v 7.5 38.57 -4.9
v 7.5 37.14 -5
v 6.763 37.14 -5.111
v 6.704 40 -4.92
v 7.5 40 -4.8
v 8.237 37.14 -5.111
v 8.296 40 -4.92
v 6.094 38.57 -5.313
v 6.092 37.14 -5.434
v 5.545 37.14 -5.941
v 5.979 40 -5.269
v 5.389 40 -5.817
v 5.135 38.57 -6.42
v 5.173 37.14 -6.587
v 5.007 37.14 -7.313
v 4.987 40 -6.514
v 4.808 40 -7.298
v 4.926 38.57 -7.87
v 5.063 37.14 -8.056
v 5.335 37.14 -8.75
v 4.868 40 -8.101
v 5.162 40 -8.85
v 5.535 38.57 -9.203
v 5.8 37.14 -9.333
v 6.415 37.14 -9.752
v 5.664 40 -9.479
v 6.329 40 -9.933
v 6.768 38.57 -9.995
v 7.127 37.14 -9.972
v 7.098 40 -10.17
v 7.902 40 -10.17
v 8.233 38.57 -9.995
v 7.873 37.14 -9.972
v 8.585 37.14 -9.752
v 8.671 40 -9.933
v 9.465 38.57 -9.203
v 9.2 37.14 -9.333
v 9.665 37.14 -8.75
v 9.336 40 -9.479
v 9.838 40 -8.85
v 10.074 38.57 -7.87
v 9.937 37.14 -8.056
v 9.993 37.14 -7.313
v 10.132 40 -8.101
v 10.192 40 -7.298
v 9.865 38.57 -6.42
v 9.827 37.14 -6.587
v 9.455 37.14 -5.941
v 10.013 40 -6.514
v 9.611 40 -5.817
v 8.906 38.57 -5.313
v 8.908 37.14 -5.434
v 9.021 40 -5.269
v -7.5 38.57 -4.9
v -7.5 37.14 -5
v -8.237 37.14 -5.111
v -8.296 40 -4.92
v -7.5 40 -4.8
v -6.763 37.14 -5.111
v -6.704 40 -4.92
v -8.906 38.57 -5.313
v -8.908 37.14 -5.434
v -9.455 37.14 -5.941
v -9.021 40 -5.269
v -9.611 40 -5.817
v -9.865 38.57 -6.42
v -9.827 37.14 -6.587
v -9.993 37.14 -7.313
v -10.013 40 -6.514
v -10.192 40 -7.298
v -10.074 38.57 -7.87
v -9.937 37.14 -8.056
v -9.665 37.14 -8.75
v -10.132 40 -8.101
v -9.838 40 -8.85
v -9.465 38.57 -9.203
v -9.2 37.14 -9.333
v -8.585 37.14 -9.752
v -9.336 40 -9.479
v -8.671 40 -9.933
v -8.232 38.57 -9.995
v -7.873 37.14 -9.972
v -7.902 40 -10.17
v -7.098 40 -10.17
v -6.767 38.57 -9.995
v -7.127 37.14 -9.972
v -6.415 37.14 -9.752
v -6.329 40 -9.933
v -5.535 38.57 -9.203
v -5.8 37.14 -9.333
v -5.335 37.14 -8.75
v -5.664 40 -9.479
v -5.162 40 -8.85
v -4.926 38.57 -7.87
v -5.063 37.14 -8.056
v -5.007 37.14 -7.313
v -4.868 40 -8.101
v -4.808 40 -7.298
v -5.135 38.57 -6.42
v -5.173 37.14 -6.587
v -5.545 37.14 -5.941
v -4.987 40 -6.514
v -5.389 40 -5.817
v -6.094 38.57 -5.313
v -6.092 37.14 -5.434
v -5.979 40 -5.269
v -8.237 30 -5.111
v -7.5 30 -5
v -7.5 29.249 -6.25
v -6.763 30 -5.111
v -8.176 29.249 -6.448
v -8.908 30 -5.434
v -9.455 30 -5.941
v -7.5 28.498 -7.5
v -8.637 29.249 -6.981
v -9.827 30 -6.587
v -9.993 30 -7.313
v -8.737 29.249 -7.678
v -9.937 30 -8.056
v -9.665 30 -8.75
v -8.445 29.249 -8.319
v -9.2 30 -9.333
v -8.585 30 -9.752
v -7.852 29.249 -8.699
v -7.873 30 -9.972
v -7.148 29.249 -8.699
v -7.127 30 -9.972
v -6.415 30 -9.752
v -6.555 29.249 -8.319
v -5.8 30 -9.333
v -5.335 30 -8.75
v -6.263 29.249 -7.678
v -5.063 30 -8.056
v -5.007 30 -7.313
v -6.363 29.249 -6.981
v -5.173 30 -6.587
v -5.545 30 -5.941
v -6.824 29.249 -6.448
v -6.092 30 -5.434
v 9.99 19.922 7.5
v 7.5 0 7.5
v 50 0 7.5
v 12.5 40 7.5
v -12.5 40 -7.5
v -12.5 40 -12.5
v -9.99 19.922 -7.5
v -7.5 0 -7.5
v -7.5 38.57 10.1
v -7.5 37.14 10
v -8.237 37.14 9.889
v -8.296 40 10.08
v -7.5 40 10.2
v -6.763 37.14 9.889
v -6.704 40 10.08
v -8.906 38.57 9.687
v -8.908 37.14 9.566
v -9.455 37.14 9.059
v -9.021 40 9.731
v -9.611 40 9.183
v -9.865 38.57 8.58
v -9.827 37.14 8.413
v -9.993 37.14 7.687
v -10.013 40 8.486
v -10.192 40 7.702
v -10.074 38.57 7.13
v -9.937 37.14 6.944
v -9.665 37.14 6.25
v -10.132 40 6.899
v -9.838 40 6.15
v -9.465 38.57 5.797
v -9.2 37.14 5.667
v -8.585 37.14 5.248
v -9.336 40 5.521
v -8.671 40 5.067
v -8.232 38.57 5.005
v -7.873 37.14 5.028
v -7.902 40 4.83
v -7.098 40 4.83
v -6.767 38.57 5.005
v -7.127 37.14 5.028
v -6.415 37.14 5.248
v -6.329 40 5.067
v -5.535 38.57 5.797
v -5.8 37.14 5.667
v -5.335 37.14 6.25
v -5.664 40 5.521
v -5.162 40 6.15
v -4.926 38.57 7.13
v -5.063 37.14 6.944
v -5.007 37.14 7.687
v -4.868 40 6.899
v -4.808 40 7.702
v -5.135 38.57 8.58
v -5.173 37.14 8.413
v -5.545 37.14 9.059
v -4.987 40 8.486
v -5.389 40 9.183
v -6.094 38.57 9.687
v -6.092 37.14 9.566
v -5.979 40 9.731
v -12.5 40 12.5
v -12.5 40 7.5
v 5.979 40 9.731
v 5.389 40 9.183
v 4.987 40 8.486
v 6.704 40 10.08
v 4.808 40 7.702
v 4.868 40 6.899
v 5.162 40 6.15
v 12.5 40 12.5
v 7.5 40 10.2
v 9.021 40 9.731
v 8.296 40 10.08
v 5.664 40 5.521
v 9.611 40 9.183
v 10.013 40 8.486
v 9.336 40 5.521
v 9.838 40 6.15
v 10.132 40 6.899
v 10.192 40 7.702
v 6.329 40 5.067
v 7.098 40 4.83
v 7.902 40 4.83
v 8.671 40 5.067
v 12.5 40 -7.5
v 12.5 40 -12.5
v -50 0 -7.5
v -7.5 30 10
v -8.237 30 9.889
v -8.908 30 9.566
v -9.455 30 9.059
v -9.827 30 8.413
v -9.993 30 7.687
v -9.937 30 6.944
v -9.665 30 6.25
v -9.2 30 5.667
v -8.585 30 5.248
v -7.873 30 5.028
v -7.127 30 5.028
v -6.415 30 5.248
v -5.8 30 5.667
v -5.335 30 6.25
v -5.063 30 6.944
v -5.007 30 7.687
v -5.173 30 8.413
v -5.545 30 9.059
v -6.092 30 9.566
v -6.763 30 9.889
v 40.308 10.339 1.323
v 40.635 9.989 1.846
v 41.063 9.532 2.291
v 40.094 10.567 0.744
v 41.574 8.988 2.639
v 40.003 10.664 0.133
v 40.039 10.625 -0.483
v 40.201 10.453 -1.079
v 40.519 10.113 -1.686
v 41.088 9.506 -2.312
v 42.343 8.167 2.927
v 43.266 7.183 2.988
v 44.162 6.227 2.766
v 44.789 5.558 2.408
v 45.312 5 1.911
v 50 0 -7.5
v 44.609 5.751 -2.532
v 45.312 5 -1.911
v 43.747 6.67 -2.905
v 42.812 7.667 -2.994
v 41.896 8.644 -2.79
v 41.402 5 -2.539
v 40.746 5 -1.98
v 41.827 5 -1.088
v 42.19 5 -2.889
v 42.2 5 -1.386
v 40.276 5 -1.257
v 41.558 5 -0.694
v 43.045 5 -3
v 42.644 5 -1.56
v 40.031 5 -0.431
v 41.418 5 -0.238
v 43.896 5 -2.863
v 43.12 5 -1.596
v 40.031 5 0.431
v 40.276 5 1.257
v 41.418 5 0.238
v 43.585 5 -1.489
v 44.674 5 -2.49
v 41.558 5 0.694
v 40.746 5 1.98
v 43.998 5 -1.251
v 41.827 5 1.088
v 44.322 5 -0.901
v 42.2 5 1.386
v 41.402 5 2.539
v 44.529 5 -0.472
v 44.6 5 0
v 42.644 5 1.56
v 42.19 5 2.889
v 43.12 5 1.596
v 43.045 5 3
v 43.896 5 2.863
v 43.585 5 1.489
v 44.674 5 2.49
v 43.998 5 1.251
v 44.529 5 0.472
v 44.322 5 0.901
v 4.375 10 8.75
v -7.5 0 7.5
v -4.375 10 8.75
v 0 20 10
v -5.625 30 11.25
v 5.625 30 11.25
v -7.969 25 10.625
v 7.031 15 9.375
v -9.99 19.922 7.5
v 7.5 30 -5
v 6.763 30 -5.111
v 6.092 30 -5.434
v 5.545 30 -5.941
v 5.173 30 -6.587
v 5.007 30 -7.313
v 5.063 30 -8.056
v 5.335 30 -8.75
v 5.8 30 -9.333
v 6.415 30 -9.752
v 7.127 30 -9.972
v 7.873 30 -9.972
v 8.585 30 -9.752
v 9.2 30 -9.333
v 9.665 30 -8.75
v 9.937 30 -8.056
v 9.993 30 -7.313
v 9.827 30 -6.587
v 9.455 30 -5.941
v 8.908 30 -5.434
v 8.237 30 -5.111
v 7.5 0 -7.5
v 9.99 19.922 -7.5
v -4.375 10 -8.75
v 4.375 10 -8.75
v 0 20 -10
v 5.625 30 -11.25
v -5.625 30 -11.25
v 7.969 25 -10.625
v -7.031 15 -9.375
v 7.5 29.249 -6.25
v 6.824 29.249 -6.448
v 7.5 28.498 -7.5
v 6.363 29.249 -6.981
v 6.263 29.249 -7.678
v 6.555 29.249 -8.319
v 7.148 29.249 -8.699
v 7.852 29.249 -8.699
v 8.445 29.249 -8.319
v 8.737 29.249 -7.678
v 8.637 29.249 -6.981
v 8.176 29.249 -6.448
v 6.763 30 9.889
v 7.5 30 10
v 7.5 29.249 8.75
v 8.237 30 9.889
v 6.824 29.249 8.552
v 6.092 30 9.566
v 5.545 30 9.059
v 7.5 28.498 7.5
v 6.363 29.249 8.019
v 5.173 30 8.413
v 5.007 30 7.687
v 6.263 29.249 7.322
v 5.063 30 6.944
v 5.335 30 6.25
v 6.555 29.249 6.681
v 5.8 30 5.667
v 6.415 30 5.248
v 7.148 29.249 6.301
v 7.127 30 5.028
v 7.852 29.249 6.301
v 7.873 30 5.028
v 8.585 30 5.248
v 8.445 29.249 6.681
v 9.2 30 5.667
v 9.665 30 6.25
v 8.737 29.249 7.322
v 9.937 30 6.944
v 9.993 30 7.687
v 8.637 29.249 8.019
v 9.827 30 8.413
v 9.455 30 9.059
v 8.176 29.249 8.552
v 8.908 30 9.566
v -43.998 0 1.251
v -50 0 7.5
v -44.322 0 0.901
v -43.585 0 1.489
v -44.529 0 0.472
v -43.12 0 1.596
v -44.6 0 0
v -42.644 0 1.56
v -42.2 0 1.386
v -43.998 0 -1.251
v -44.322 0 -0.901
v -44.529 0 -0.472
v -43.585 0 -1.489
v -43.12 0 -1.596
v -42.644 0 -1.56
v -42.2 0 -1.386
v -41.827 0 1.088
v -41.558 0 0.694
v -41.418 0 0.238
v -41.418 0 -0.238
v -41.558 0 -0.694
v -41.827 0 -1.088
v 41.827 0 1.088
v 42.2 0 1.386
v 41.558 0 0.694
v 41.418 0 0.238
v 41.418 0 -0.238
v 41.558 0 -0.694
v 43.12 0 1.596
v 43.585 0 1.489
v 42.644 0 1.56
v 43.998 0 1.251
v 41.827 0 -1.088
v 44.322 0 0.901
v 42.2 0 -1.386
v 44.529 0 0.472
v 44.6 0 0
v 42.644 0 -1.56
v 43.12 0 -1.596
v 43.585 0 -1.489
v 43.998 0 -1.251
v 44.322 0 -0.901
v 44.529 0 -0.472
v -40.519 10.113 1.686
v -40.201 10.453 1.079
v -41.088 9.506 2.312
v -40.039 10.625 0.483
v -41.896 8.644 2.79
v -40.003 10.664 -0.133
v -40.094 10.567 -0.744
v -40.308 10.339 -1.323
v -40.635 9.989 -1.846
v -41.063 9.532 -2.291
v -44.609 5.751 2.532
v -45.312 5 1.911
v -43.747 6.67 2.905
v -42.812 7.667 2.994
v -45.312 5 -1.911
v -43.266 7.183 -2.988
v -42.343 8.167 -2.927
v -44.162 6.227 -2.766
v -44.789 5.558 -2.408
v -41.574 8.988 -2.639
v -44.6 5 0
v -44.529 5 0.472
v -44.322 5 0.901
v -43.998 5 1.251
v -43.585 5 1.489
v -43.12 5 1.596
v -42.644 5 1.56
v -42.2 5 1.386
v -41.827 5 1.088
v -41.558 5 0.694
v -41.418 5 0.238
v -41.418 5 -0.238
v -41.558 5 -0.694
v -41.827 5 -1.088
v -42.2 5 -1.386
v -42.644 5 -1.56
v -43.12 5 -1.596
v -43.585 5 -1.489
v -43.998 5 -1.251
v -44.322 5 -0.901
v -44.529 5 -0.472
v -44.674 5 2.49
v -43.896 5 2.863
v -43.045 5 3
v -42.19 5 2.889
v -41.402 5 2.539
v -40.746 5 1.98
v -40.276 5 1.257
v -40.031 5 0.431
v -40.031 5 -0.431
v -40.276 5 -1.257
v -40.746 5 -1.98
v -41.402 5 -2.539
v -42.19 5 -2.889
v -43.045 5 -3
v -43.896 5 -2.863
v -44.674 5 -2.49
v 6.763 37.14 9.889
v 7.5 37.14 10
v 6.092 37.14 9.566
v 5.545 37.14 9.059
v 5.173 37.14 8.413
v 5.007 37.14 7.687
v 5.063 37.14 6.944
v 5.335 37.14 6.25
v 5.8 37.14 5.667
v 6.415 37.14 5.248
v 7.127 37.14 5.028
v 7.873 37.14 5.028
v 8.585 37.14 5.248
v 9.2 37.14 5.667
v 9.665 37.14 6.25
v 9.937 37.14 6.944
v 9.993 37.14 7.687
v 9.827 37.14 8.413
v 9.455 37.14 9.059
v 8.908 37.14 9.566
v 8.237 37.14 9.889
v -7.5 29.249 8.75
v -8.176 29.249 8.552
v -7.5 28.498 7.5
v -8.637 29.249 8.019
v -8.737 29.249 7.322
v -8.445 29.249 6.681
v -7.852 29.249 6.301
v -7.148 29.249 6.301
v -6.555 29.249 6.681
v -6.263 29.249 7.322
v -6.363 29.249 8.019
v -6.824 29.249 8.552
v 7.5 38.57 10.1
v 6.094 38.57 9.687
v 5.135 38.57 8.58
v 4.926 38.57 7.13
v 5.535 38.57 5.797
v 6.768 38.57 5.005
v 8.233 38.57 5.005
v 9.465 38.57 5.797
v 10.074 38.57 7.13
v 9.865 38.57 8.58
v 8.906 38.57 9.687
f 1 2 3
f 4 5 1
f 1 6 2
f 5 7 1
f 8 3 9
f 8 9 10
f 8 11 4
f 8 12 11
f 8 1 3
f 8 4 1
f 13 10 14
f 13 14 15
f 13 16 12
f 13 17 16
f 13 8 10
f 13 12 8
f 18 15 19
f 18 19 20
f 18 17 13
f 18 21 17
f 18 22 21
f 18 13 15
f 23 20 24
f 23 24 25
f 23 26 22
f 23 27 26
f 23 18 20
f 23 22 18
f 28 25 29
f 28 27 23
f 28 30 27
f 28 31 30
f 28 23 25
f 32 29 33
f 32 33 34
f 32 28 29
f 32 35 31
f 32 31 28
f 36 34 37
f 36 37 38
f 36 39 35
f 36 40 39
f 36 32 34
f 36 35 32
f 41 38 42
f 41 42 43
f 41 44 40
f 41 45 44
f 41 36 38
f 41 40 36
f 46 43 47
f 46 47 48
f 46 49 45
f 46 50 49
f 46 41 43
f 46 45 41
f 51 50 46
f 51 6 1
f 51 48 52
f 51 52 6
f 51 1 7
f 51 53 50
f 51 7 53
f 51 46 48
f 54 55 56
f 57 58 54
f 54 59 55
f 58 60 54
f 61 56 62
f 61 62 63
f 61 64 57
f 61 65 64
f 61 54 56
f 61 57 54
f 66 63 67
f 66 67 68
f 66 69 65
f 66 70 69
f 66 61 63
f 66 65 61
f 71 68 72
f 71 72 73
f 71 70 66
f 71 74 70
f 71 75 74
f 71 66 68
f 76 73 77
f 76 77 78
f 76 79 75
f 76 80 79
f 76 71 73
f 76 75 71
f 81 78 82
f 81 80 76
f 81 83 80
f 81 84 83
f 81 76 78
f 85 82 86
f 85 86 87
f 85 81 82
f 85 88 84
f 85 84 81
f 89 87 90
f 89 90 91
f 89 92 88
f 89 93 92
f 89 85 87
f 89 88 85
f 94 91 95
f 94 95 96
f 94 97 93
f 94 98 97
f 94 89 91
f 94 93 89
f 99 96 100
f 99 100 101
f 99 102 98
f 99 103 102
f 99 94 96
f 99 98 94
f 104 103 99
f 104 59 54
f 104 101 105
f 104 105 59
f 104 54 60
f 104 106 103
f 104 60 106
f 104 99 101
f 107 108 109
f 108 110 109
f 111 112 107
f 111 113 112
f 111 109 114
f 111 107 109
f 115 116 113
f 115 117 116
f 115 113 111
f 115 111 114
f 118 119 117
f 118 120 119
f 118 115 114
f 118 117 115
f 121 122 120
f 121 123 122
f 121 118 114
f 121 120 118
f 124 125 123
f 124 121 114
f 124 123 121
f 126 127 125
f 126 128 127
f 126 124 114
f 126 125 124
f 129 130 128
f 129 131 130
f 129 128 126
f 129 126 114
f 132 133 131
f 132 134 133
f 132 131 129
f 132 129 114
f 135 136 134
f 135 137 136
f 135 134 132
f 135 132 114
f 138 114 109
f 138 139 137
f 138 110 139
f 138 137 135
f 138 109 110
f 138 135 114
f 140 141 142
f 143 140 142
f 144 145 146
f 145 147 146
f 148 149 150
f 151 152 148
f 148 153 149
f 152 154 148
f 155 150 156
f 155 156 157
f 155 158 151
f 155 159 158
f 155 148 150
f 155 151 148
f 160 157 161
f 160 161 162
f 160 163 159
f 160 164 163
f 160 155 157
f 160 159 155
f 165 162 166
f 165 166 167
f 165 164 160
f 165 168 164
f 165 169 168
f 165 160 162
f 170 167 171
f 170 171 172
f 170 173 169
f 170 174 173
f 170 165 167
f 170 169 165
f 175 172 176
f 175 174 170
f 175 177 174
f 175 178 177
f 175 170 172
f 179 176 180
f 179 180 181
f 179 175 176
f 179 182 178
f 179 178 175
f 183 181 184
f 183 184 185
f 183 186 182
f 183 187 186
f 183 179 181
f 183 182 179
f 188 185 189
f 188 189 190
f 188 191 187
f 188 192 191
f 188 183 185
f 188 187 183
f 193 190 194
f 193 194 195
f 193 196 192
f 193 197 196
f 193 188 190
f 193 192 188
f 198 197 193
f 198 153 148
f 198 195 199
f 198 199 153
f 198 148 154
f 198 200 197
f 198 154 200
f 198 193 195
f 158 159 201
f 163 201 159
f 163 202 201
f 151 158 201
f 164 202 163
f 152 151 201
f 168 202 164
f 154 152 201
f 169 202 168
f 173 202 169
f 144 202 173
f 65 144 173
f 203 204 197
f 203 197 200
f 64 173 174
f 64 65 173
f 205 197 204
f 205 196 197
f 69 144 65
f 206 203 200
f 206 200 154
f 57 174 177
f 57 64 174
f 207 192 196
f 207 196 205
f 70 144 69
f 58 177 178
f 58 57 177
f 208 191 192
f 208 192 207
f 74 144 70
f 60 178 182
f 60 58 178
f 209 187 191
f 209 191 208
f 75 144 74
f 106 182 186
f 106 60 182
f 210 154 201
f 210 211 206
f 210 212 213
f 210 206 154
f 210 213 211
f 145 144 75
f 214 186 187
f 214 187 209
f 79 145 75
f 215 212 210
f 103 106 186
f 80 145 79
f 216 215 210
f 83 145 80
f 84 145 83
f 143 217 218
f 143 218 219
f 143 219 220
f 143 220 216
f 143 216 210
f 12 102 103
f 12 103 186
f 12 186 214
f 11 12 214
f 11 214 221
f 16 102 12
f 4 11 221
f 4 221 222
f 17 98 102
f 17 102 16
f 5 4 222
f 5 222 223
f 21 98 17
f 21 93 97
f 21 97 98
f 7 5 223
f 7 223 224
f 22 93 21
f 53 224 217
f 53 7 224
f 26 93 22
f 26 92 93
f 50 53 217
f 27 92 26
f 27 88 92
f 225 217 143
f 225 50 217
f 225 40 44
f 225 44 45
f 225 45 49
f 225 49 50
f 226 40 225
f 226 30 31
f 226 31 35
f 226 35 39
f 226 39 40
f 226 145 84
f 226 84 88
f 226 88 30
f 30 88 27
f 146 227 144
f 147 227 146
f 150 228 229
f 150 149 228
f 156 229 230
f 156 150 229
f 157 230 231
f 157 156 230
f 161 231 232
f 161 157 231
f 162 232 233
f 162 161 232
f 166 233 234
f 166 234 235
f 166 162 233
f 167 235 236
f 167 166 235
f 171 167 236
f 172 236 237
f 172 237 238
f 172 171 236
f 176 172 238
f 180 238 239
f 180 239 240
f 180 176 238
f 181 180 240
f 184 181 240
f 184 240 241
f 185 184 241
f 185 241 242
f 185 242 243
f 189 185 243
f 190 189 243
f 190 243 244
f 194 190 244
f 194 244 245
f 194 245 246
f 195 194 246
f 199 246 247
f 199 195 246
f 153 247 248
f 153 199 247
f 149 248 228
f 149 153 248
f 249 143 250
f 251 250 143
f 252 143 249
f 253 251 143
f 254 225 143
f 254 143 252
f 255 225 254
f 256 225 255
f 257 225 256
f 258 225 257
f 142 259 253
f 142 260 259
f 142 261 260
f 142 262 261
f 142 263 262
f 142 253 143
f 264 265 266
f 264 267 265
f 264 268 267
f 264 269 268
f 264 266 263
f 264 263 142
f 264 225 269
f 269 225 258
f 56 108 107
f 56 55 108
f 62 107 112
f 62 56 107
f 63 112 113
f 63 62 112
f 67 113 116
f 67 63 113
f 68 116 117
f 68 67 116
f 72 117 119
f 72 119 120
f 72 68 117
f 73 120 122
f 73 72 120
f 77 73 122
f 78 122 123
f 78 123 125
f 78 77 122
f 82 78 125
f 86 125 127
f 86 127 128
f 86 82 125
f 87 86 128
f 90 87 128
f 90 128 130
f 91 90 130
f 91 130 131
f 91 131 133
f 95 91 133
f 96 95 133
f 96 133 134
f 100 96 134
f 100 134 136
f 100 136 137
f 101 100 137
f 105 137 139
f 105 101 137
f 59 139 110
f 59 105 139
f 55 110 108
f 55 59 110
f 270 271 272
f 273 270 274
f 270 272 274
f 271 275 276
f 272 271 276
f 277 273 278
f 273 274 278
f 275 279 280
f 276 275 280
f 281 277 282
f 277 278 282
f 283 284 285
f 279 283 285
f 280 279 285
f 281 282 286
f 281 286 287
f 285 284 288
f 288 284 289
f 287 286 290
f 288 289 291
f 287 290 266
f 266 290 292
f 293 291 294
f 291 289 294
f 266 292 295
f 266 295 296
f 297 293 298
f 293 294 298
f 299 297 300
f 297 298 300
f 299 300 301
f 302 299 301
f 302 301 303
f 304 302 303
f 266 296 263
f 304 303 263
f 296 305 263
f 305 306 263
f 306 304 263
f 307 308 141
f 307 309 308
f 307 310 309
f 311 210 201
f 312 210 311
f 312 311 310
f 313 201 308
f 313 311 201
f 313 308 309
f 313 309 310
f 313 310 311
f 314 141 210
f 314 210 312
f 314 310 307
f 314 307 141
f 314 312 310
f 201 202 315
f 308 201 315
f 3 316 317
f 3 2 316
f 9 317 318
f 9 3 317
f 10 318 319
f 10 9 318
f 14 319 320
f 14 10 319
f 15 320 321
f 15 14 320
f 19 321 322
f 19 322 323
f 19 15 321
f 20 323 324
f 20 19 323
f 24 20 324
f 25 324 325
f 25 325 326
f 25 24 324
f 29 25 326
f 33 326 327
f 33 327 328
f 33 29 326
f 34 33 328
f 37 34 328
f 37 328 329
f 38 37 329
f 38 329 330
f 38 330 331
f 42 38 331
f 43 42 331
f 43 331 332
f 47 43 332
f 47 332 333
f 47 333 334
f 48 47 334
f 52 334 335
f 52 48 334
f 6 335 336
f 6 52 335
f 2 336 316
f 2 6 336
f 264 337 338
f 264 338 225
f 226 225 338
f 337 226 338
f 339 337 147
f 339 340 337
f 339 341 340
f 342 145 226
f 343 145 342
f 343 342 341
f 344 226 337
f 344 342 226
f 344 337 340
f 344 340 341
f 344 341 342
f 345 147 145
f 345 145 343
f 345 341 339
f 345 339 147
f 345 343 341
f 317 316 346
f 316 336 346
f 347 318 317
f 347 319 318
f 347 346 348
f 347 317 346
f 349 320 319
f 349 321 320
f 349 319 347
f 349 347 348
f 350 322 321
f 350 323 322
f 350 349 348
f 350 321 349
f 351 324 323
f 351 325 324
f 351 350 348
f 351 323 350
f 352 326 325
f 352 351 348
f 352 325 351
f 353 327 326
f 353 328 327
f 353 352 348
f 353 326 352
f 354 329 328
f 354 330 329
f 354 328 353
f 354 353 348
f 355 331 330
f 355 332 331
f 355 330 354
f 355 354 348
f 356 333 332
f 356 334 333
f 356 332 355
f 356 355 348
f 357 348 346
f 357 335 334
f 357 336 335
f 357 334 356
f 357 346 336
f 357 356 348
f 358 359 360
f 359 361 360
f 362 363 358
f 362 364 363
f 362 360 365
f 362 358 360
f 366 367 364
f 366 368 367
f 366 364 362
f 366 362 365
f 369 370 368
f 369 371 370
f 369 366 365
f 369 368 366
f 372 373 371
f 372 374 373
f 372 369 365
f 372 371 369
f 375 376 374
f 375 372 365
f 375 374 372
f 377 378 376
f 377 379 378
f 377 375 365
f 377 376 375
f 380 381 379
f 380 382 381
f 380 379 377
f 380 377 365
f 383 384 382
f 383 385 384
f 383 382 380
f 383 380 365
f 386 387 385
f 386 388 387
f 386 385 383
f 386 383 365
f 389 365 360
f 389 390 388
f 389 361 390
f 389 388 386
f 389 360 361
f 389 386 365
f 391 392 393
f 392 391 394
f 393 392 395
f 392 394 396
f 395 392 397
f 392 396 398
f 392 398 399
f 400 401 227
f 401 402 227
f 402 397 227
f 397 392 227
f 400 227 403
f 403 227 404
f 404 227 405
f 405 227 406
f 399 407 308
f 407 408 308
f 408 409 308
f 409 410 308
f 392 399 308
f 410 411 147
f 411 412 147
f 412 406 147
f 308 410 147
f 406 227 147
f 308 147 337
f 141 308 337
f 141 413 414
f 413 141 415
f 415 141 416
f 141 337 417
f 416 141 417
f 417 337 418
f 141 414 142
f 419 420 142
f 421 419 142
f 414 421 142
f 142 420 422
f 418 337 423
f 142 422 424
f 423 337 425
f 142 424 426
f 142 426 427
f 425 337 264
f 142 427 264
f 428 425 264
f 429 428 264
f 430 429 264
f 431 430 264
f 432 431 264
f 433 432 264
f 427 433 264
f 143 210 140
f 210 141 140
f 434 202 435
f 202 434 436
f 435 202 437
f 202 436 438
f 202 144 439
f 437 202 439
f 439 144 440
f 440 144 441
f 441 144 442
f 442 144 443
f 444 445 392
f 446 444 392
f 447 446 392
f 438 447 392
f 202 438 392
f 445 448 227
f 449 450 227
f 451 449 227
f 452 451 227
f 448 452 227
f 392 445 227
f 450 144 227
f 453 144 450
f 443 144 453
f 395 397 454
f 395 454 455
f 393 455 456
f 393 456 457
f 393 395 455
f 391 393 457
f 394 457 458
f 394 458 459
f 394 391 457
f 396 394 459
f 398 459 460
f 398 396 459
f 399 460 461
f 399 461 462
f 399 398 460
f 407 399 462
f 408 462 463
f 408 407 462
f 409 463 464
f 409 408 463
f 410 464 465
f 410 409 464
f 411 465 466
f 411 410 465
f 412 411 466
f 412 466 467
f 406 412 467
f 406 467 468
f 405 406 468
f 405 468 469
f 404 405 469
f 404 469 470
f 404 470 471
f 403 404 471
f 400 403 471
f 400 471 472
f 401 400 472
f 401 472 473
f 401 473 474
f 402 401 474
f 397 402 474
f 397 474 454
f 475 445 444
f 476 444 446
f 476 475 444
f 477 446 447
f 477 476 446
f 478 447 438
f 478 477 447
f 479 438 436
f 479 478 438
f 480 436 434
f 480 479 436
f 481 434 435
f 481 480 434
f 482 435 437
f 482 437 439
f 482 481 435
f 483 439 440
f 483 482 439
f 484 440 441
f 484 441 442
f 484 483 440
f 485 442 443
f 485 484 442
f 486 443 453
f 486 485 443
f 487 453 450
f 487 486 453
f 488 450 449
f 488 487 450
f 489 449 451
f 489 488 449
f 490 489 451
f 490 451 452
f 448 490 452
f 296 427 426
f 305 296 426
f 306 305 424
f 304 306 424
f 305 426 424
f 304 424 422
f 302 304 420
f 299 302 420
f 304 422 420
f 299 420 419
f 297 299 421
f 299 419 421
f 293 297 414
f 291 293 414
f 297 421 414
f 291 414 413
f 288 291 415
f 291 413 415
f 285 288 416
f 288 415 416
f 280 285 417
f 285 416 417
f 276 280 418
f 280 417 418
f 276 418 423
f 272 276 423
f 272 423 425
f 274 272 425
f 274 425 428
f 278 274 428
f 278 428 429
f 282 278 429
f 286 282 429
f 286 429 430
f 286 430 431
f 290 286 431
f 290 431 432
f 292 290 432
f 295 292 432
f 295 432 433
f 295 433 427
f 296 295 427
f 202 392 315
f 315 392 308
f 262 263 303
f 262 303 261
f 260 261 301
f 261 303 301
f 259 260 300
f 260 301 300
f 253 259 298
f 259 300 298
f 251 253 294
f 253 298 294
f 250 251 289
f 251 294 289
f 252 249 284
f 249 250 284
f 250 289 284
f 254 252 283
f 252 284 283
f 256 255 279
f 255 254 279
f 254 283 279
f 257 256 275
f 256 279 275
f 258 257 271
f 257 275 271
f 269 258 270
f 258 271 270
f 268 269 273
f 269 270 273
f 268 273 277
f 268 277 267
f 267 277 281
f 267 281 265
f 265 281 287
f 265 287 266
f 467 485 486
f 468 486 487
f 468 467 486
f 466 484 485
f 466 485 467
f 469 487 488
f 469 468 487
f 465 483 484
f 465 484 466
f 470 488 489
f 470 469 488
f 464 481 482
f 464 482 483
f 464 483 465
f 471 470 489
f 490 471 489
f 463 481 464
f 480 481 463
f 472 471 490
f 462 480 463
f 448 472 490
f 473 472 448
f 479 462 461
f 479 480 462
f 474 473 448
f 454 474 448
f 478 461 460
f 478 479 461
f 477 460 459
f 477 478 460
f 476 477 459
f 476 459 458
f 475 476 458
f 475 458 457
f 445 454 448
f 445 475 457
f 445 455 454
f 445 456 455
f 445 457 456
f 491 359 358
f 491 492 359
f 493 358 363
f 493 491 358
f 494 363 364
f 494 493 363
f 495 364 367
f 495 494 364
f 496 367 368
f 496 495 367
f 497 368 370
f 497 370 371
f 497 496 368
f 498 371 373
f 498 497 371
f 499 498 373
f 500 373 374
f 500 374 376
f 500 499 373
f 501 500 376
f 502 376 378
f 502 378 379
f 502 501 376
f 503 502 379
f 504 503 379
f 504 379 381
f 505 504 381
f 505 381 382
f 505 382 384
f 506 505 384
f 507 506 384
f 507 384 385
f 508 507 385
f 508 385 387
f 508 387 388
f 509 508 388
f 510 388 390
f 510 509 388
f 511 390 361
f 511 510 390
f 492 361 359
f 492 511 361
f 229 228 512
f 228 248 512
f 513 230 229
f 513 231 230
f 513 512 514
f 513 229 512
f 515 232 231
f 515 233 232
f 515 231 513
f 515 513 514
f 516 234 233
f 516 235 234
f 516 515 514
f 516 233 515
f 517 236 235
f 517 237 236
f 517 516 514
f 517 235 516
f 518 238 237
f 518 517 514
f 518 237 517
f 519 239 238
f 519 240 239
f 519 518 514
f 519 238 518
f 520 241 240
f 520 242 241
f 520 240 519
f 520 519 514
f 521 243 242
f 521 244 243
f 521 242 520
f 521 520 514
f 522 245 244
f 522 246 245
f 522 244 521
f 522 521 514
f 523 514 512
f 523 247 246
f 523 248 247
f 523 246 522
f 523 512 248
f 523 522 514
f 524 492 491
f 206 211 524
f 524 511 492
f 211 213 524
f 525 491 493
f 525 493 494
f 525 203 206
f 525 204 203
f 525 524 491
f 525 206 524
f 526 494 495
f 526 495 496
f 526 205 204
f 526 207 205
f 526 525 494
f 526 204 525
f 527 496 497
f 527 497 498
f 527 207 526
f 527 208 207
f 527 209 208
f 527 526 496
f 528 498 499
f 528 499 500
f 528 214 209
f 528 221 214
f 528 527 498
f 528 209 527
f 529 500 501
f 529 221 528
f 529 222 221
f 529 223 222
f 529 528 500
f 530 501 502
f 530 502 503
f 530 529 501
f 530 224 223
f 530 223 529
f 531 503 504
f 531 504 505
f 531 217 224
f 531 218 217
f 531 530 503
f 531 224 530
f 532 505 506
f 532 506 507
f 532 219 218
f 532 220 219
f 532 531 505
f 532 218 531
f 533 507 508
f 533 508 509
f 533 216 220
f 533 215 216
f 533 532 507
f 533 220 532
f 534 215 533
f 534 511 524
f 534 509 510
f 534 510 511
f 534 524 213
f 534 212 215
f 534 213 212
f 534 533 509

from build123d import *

# Parameters (mm, degrees)
SKETCH2_W            = 15
SKETCH2_H            = 15
BOSS_EXTRUDE1_DEPTH  = 40
BOSS_EXTRUDE1_TAPER  = -7.125
SKETCH2_4_W          = 42.5
SKETCH2_4_H          = 15
BOSS_EXTRUDE4_DEPTH  = 40
CUT_EXTRUDE1_DEPTH   = 15
CUT_EXTRUDE2_START   = -5
SKETCH5_R            = 1.6
SKETCH5_R_2          = 3
CUT_EXTRUDE2_DEPTH   = 35
SKETCH5_3_R          = 1.6
CUT_EXTRUDE3_DEPTH   = 41.0000001
LPATTERN1_COUNT      = 2
LPATTERN1_PITCH      = 15
LPATTERN1_COUNT_DIR2 = 2
LPATTERN1_PITCH_DIR2 = 15


with BuildPart() as part:
    # Sketch2 → Boss-Extrude1 (new body)
    with BuildSketch(Plane(origin=(0, 0, 0), x_dir=(1, 0, 0), z_dir=(0, 1, 0))):
        Rectangle(SKETCH2_W, SKETCH2_H)
    extrude(amount=BOSS_EXTRUDE1_DEPTH, taper=BOSS_EXTRUDE1_TAPER)

    # Sketch2<4> → Boss-Extrude4 (add)
    with BuildSketch(Plane(origin=(0, 0, 0), x_dir=(1, 0, 0), z_dir=(0, 1, 0))):
        with Locations((-28.75, 0)):
            Rectangle(SKETCH2_4_W, SKETCH2_4_H)
        with Locations((28.75, 0)):
            Rectangle(SKETCH2_4_W, SKETCH2_4_H)
    extrude(amount=BOSS_EXTRUDE4_DEPTH)

    # Sketch4 → Cut-Extrude1 (cut)
    with BuildSketch(Plane(origin=(0, 0, -7.5), x_dir=(-1, 0, 0), z_dir=(0, 0, -1))):
        Polygon((-12.499988408, 40), (-50, 0), (-50, 40), align=None)
    cut_extrude1 = extrude(amount=-CUT_EXTRUDE1_DEPTH, mode=Mode.SUBTRACT)

    # Sketch5 → Cut-Extrude2 (cut)
    with BuildSketch(Plane.XZ.offset(CUT_EXTRUDE2_START)):
        with Locations((43, 0)):
            Circle(SKETCH5_R)
        with Locations((43, 0)):
            Circle(SKETCH5_R_2)
        with Locations((43, 0)):
            Circle(SKETCH5_R, mode=Mode.SUBTRACT)
    cut_extrude2 = extrude(amount=-CUT_EXTRUDE2_DEPTH, mode=Mode.SUBTRACT)

    # Sketch5<3> → Cut-Extrude3 (cut, through all)
    with BuildSketch(Plane.XZ):
        with Locations((43, 0)):
            Circle(SKETCH5_3_R)
    cut_extrude3 = extrude(amount=-CUT_EXTRUDE3_DEPTH, mode=Mode.SUBTRACT)

    # Mirror1: Cut-Extrude1, Cut-Extrude2, Cut-Extrude3 across plane
    add(cut_extrude1.mirror(Plane(origin=(0, 0, 0), x_dir=(0, 0, 1), z_dir=(1, 0, 0))), mode=Mode.SUBTRACT)
    add(cut_extrude2.mirror(Plane(origin=(0, 0, 0), x_dir=(0, 0, 1), z_dir=(1, 0, 0))), mode=Mode.SUBTRACT)
    add(cut_extrude3.mirror(Plane(origin=(0, 0, 0), x_dir=(0, 0, 1), z_dir=(1, 0, 0))), mode=Mode.SUBTRACT)

    # Sketch8 → CSK for M3 Oval Head Machine Screw1 (revolve, cut)
    with BuildSketch(Plane(origin=(-7.499988408, 40, -7.499988408), x_dir=(0, 0, 1), z_dir=(1, 0, 0))):
        Polygon((0, 0), (0, 11.502151548), (2.5, 10), (2.5, 2.860133251), (2.7, 0), align=None)
    csk_for_m3_oval_head_machine_screw1 = revolve(axis=Axis((-7.499988408, 46.35, -7.499988408), (0, -1, 0)), mode=Mode.SUBTRACT)

    # LPattern1: CSK for M3 Oval Head Machine Screw1 2 × 2
    with Locations(*[(j * LPATTERN1_PITCH_DIR2, 0, i * LPATTERN1_PITCH) for i in range(LPATTERN1_COUNT) for j in range(LPATTERN1_COUNT_DIR2) if (i, j) != (0, 0)]):
        add(csk_for_m3_oval_head_machine_screw1, mode=Mode.SUBTRACT)


solid = part.part
